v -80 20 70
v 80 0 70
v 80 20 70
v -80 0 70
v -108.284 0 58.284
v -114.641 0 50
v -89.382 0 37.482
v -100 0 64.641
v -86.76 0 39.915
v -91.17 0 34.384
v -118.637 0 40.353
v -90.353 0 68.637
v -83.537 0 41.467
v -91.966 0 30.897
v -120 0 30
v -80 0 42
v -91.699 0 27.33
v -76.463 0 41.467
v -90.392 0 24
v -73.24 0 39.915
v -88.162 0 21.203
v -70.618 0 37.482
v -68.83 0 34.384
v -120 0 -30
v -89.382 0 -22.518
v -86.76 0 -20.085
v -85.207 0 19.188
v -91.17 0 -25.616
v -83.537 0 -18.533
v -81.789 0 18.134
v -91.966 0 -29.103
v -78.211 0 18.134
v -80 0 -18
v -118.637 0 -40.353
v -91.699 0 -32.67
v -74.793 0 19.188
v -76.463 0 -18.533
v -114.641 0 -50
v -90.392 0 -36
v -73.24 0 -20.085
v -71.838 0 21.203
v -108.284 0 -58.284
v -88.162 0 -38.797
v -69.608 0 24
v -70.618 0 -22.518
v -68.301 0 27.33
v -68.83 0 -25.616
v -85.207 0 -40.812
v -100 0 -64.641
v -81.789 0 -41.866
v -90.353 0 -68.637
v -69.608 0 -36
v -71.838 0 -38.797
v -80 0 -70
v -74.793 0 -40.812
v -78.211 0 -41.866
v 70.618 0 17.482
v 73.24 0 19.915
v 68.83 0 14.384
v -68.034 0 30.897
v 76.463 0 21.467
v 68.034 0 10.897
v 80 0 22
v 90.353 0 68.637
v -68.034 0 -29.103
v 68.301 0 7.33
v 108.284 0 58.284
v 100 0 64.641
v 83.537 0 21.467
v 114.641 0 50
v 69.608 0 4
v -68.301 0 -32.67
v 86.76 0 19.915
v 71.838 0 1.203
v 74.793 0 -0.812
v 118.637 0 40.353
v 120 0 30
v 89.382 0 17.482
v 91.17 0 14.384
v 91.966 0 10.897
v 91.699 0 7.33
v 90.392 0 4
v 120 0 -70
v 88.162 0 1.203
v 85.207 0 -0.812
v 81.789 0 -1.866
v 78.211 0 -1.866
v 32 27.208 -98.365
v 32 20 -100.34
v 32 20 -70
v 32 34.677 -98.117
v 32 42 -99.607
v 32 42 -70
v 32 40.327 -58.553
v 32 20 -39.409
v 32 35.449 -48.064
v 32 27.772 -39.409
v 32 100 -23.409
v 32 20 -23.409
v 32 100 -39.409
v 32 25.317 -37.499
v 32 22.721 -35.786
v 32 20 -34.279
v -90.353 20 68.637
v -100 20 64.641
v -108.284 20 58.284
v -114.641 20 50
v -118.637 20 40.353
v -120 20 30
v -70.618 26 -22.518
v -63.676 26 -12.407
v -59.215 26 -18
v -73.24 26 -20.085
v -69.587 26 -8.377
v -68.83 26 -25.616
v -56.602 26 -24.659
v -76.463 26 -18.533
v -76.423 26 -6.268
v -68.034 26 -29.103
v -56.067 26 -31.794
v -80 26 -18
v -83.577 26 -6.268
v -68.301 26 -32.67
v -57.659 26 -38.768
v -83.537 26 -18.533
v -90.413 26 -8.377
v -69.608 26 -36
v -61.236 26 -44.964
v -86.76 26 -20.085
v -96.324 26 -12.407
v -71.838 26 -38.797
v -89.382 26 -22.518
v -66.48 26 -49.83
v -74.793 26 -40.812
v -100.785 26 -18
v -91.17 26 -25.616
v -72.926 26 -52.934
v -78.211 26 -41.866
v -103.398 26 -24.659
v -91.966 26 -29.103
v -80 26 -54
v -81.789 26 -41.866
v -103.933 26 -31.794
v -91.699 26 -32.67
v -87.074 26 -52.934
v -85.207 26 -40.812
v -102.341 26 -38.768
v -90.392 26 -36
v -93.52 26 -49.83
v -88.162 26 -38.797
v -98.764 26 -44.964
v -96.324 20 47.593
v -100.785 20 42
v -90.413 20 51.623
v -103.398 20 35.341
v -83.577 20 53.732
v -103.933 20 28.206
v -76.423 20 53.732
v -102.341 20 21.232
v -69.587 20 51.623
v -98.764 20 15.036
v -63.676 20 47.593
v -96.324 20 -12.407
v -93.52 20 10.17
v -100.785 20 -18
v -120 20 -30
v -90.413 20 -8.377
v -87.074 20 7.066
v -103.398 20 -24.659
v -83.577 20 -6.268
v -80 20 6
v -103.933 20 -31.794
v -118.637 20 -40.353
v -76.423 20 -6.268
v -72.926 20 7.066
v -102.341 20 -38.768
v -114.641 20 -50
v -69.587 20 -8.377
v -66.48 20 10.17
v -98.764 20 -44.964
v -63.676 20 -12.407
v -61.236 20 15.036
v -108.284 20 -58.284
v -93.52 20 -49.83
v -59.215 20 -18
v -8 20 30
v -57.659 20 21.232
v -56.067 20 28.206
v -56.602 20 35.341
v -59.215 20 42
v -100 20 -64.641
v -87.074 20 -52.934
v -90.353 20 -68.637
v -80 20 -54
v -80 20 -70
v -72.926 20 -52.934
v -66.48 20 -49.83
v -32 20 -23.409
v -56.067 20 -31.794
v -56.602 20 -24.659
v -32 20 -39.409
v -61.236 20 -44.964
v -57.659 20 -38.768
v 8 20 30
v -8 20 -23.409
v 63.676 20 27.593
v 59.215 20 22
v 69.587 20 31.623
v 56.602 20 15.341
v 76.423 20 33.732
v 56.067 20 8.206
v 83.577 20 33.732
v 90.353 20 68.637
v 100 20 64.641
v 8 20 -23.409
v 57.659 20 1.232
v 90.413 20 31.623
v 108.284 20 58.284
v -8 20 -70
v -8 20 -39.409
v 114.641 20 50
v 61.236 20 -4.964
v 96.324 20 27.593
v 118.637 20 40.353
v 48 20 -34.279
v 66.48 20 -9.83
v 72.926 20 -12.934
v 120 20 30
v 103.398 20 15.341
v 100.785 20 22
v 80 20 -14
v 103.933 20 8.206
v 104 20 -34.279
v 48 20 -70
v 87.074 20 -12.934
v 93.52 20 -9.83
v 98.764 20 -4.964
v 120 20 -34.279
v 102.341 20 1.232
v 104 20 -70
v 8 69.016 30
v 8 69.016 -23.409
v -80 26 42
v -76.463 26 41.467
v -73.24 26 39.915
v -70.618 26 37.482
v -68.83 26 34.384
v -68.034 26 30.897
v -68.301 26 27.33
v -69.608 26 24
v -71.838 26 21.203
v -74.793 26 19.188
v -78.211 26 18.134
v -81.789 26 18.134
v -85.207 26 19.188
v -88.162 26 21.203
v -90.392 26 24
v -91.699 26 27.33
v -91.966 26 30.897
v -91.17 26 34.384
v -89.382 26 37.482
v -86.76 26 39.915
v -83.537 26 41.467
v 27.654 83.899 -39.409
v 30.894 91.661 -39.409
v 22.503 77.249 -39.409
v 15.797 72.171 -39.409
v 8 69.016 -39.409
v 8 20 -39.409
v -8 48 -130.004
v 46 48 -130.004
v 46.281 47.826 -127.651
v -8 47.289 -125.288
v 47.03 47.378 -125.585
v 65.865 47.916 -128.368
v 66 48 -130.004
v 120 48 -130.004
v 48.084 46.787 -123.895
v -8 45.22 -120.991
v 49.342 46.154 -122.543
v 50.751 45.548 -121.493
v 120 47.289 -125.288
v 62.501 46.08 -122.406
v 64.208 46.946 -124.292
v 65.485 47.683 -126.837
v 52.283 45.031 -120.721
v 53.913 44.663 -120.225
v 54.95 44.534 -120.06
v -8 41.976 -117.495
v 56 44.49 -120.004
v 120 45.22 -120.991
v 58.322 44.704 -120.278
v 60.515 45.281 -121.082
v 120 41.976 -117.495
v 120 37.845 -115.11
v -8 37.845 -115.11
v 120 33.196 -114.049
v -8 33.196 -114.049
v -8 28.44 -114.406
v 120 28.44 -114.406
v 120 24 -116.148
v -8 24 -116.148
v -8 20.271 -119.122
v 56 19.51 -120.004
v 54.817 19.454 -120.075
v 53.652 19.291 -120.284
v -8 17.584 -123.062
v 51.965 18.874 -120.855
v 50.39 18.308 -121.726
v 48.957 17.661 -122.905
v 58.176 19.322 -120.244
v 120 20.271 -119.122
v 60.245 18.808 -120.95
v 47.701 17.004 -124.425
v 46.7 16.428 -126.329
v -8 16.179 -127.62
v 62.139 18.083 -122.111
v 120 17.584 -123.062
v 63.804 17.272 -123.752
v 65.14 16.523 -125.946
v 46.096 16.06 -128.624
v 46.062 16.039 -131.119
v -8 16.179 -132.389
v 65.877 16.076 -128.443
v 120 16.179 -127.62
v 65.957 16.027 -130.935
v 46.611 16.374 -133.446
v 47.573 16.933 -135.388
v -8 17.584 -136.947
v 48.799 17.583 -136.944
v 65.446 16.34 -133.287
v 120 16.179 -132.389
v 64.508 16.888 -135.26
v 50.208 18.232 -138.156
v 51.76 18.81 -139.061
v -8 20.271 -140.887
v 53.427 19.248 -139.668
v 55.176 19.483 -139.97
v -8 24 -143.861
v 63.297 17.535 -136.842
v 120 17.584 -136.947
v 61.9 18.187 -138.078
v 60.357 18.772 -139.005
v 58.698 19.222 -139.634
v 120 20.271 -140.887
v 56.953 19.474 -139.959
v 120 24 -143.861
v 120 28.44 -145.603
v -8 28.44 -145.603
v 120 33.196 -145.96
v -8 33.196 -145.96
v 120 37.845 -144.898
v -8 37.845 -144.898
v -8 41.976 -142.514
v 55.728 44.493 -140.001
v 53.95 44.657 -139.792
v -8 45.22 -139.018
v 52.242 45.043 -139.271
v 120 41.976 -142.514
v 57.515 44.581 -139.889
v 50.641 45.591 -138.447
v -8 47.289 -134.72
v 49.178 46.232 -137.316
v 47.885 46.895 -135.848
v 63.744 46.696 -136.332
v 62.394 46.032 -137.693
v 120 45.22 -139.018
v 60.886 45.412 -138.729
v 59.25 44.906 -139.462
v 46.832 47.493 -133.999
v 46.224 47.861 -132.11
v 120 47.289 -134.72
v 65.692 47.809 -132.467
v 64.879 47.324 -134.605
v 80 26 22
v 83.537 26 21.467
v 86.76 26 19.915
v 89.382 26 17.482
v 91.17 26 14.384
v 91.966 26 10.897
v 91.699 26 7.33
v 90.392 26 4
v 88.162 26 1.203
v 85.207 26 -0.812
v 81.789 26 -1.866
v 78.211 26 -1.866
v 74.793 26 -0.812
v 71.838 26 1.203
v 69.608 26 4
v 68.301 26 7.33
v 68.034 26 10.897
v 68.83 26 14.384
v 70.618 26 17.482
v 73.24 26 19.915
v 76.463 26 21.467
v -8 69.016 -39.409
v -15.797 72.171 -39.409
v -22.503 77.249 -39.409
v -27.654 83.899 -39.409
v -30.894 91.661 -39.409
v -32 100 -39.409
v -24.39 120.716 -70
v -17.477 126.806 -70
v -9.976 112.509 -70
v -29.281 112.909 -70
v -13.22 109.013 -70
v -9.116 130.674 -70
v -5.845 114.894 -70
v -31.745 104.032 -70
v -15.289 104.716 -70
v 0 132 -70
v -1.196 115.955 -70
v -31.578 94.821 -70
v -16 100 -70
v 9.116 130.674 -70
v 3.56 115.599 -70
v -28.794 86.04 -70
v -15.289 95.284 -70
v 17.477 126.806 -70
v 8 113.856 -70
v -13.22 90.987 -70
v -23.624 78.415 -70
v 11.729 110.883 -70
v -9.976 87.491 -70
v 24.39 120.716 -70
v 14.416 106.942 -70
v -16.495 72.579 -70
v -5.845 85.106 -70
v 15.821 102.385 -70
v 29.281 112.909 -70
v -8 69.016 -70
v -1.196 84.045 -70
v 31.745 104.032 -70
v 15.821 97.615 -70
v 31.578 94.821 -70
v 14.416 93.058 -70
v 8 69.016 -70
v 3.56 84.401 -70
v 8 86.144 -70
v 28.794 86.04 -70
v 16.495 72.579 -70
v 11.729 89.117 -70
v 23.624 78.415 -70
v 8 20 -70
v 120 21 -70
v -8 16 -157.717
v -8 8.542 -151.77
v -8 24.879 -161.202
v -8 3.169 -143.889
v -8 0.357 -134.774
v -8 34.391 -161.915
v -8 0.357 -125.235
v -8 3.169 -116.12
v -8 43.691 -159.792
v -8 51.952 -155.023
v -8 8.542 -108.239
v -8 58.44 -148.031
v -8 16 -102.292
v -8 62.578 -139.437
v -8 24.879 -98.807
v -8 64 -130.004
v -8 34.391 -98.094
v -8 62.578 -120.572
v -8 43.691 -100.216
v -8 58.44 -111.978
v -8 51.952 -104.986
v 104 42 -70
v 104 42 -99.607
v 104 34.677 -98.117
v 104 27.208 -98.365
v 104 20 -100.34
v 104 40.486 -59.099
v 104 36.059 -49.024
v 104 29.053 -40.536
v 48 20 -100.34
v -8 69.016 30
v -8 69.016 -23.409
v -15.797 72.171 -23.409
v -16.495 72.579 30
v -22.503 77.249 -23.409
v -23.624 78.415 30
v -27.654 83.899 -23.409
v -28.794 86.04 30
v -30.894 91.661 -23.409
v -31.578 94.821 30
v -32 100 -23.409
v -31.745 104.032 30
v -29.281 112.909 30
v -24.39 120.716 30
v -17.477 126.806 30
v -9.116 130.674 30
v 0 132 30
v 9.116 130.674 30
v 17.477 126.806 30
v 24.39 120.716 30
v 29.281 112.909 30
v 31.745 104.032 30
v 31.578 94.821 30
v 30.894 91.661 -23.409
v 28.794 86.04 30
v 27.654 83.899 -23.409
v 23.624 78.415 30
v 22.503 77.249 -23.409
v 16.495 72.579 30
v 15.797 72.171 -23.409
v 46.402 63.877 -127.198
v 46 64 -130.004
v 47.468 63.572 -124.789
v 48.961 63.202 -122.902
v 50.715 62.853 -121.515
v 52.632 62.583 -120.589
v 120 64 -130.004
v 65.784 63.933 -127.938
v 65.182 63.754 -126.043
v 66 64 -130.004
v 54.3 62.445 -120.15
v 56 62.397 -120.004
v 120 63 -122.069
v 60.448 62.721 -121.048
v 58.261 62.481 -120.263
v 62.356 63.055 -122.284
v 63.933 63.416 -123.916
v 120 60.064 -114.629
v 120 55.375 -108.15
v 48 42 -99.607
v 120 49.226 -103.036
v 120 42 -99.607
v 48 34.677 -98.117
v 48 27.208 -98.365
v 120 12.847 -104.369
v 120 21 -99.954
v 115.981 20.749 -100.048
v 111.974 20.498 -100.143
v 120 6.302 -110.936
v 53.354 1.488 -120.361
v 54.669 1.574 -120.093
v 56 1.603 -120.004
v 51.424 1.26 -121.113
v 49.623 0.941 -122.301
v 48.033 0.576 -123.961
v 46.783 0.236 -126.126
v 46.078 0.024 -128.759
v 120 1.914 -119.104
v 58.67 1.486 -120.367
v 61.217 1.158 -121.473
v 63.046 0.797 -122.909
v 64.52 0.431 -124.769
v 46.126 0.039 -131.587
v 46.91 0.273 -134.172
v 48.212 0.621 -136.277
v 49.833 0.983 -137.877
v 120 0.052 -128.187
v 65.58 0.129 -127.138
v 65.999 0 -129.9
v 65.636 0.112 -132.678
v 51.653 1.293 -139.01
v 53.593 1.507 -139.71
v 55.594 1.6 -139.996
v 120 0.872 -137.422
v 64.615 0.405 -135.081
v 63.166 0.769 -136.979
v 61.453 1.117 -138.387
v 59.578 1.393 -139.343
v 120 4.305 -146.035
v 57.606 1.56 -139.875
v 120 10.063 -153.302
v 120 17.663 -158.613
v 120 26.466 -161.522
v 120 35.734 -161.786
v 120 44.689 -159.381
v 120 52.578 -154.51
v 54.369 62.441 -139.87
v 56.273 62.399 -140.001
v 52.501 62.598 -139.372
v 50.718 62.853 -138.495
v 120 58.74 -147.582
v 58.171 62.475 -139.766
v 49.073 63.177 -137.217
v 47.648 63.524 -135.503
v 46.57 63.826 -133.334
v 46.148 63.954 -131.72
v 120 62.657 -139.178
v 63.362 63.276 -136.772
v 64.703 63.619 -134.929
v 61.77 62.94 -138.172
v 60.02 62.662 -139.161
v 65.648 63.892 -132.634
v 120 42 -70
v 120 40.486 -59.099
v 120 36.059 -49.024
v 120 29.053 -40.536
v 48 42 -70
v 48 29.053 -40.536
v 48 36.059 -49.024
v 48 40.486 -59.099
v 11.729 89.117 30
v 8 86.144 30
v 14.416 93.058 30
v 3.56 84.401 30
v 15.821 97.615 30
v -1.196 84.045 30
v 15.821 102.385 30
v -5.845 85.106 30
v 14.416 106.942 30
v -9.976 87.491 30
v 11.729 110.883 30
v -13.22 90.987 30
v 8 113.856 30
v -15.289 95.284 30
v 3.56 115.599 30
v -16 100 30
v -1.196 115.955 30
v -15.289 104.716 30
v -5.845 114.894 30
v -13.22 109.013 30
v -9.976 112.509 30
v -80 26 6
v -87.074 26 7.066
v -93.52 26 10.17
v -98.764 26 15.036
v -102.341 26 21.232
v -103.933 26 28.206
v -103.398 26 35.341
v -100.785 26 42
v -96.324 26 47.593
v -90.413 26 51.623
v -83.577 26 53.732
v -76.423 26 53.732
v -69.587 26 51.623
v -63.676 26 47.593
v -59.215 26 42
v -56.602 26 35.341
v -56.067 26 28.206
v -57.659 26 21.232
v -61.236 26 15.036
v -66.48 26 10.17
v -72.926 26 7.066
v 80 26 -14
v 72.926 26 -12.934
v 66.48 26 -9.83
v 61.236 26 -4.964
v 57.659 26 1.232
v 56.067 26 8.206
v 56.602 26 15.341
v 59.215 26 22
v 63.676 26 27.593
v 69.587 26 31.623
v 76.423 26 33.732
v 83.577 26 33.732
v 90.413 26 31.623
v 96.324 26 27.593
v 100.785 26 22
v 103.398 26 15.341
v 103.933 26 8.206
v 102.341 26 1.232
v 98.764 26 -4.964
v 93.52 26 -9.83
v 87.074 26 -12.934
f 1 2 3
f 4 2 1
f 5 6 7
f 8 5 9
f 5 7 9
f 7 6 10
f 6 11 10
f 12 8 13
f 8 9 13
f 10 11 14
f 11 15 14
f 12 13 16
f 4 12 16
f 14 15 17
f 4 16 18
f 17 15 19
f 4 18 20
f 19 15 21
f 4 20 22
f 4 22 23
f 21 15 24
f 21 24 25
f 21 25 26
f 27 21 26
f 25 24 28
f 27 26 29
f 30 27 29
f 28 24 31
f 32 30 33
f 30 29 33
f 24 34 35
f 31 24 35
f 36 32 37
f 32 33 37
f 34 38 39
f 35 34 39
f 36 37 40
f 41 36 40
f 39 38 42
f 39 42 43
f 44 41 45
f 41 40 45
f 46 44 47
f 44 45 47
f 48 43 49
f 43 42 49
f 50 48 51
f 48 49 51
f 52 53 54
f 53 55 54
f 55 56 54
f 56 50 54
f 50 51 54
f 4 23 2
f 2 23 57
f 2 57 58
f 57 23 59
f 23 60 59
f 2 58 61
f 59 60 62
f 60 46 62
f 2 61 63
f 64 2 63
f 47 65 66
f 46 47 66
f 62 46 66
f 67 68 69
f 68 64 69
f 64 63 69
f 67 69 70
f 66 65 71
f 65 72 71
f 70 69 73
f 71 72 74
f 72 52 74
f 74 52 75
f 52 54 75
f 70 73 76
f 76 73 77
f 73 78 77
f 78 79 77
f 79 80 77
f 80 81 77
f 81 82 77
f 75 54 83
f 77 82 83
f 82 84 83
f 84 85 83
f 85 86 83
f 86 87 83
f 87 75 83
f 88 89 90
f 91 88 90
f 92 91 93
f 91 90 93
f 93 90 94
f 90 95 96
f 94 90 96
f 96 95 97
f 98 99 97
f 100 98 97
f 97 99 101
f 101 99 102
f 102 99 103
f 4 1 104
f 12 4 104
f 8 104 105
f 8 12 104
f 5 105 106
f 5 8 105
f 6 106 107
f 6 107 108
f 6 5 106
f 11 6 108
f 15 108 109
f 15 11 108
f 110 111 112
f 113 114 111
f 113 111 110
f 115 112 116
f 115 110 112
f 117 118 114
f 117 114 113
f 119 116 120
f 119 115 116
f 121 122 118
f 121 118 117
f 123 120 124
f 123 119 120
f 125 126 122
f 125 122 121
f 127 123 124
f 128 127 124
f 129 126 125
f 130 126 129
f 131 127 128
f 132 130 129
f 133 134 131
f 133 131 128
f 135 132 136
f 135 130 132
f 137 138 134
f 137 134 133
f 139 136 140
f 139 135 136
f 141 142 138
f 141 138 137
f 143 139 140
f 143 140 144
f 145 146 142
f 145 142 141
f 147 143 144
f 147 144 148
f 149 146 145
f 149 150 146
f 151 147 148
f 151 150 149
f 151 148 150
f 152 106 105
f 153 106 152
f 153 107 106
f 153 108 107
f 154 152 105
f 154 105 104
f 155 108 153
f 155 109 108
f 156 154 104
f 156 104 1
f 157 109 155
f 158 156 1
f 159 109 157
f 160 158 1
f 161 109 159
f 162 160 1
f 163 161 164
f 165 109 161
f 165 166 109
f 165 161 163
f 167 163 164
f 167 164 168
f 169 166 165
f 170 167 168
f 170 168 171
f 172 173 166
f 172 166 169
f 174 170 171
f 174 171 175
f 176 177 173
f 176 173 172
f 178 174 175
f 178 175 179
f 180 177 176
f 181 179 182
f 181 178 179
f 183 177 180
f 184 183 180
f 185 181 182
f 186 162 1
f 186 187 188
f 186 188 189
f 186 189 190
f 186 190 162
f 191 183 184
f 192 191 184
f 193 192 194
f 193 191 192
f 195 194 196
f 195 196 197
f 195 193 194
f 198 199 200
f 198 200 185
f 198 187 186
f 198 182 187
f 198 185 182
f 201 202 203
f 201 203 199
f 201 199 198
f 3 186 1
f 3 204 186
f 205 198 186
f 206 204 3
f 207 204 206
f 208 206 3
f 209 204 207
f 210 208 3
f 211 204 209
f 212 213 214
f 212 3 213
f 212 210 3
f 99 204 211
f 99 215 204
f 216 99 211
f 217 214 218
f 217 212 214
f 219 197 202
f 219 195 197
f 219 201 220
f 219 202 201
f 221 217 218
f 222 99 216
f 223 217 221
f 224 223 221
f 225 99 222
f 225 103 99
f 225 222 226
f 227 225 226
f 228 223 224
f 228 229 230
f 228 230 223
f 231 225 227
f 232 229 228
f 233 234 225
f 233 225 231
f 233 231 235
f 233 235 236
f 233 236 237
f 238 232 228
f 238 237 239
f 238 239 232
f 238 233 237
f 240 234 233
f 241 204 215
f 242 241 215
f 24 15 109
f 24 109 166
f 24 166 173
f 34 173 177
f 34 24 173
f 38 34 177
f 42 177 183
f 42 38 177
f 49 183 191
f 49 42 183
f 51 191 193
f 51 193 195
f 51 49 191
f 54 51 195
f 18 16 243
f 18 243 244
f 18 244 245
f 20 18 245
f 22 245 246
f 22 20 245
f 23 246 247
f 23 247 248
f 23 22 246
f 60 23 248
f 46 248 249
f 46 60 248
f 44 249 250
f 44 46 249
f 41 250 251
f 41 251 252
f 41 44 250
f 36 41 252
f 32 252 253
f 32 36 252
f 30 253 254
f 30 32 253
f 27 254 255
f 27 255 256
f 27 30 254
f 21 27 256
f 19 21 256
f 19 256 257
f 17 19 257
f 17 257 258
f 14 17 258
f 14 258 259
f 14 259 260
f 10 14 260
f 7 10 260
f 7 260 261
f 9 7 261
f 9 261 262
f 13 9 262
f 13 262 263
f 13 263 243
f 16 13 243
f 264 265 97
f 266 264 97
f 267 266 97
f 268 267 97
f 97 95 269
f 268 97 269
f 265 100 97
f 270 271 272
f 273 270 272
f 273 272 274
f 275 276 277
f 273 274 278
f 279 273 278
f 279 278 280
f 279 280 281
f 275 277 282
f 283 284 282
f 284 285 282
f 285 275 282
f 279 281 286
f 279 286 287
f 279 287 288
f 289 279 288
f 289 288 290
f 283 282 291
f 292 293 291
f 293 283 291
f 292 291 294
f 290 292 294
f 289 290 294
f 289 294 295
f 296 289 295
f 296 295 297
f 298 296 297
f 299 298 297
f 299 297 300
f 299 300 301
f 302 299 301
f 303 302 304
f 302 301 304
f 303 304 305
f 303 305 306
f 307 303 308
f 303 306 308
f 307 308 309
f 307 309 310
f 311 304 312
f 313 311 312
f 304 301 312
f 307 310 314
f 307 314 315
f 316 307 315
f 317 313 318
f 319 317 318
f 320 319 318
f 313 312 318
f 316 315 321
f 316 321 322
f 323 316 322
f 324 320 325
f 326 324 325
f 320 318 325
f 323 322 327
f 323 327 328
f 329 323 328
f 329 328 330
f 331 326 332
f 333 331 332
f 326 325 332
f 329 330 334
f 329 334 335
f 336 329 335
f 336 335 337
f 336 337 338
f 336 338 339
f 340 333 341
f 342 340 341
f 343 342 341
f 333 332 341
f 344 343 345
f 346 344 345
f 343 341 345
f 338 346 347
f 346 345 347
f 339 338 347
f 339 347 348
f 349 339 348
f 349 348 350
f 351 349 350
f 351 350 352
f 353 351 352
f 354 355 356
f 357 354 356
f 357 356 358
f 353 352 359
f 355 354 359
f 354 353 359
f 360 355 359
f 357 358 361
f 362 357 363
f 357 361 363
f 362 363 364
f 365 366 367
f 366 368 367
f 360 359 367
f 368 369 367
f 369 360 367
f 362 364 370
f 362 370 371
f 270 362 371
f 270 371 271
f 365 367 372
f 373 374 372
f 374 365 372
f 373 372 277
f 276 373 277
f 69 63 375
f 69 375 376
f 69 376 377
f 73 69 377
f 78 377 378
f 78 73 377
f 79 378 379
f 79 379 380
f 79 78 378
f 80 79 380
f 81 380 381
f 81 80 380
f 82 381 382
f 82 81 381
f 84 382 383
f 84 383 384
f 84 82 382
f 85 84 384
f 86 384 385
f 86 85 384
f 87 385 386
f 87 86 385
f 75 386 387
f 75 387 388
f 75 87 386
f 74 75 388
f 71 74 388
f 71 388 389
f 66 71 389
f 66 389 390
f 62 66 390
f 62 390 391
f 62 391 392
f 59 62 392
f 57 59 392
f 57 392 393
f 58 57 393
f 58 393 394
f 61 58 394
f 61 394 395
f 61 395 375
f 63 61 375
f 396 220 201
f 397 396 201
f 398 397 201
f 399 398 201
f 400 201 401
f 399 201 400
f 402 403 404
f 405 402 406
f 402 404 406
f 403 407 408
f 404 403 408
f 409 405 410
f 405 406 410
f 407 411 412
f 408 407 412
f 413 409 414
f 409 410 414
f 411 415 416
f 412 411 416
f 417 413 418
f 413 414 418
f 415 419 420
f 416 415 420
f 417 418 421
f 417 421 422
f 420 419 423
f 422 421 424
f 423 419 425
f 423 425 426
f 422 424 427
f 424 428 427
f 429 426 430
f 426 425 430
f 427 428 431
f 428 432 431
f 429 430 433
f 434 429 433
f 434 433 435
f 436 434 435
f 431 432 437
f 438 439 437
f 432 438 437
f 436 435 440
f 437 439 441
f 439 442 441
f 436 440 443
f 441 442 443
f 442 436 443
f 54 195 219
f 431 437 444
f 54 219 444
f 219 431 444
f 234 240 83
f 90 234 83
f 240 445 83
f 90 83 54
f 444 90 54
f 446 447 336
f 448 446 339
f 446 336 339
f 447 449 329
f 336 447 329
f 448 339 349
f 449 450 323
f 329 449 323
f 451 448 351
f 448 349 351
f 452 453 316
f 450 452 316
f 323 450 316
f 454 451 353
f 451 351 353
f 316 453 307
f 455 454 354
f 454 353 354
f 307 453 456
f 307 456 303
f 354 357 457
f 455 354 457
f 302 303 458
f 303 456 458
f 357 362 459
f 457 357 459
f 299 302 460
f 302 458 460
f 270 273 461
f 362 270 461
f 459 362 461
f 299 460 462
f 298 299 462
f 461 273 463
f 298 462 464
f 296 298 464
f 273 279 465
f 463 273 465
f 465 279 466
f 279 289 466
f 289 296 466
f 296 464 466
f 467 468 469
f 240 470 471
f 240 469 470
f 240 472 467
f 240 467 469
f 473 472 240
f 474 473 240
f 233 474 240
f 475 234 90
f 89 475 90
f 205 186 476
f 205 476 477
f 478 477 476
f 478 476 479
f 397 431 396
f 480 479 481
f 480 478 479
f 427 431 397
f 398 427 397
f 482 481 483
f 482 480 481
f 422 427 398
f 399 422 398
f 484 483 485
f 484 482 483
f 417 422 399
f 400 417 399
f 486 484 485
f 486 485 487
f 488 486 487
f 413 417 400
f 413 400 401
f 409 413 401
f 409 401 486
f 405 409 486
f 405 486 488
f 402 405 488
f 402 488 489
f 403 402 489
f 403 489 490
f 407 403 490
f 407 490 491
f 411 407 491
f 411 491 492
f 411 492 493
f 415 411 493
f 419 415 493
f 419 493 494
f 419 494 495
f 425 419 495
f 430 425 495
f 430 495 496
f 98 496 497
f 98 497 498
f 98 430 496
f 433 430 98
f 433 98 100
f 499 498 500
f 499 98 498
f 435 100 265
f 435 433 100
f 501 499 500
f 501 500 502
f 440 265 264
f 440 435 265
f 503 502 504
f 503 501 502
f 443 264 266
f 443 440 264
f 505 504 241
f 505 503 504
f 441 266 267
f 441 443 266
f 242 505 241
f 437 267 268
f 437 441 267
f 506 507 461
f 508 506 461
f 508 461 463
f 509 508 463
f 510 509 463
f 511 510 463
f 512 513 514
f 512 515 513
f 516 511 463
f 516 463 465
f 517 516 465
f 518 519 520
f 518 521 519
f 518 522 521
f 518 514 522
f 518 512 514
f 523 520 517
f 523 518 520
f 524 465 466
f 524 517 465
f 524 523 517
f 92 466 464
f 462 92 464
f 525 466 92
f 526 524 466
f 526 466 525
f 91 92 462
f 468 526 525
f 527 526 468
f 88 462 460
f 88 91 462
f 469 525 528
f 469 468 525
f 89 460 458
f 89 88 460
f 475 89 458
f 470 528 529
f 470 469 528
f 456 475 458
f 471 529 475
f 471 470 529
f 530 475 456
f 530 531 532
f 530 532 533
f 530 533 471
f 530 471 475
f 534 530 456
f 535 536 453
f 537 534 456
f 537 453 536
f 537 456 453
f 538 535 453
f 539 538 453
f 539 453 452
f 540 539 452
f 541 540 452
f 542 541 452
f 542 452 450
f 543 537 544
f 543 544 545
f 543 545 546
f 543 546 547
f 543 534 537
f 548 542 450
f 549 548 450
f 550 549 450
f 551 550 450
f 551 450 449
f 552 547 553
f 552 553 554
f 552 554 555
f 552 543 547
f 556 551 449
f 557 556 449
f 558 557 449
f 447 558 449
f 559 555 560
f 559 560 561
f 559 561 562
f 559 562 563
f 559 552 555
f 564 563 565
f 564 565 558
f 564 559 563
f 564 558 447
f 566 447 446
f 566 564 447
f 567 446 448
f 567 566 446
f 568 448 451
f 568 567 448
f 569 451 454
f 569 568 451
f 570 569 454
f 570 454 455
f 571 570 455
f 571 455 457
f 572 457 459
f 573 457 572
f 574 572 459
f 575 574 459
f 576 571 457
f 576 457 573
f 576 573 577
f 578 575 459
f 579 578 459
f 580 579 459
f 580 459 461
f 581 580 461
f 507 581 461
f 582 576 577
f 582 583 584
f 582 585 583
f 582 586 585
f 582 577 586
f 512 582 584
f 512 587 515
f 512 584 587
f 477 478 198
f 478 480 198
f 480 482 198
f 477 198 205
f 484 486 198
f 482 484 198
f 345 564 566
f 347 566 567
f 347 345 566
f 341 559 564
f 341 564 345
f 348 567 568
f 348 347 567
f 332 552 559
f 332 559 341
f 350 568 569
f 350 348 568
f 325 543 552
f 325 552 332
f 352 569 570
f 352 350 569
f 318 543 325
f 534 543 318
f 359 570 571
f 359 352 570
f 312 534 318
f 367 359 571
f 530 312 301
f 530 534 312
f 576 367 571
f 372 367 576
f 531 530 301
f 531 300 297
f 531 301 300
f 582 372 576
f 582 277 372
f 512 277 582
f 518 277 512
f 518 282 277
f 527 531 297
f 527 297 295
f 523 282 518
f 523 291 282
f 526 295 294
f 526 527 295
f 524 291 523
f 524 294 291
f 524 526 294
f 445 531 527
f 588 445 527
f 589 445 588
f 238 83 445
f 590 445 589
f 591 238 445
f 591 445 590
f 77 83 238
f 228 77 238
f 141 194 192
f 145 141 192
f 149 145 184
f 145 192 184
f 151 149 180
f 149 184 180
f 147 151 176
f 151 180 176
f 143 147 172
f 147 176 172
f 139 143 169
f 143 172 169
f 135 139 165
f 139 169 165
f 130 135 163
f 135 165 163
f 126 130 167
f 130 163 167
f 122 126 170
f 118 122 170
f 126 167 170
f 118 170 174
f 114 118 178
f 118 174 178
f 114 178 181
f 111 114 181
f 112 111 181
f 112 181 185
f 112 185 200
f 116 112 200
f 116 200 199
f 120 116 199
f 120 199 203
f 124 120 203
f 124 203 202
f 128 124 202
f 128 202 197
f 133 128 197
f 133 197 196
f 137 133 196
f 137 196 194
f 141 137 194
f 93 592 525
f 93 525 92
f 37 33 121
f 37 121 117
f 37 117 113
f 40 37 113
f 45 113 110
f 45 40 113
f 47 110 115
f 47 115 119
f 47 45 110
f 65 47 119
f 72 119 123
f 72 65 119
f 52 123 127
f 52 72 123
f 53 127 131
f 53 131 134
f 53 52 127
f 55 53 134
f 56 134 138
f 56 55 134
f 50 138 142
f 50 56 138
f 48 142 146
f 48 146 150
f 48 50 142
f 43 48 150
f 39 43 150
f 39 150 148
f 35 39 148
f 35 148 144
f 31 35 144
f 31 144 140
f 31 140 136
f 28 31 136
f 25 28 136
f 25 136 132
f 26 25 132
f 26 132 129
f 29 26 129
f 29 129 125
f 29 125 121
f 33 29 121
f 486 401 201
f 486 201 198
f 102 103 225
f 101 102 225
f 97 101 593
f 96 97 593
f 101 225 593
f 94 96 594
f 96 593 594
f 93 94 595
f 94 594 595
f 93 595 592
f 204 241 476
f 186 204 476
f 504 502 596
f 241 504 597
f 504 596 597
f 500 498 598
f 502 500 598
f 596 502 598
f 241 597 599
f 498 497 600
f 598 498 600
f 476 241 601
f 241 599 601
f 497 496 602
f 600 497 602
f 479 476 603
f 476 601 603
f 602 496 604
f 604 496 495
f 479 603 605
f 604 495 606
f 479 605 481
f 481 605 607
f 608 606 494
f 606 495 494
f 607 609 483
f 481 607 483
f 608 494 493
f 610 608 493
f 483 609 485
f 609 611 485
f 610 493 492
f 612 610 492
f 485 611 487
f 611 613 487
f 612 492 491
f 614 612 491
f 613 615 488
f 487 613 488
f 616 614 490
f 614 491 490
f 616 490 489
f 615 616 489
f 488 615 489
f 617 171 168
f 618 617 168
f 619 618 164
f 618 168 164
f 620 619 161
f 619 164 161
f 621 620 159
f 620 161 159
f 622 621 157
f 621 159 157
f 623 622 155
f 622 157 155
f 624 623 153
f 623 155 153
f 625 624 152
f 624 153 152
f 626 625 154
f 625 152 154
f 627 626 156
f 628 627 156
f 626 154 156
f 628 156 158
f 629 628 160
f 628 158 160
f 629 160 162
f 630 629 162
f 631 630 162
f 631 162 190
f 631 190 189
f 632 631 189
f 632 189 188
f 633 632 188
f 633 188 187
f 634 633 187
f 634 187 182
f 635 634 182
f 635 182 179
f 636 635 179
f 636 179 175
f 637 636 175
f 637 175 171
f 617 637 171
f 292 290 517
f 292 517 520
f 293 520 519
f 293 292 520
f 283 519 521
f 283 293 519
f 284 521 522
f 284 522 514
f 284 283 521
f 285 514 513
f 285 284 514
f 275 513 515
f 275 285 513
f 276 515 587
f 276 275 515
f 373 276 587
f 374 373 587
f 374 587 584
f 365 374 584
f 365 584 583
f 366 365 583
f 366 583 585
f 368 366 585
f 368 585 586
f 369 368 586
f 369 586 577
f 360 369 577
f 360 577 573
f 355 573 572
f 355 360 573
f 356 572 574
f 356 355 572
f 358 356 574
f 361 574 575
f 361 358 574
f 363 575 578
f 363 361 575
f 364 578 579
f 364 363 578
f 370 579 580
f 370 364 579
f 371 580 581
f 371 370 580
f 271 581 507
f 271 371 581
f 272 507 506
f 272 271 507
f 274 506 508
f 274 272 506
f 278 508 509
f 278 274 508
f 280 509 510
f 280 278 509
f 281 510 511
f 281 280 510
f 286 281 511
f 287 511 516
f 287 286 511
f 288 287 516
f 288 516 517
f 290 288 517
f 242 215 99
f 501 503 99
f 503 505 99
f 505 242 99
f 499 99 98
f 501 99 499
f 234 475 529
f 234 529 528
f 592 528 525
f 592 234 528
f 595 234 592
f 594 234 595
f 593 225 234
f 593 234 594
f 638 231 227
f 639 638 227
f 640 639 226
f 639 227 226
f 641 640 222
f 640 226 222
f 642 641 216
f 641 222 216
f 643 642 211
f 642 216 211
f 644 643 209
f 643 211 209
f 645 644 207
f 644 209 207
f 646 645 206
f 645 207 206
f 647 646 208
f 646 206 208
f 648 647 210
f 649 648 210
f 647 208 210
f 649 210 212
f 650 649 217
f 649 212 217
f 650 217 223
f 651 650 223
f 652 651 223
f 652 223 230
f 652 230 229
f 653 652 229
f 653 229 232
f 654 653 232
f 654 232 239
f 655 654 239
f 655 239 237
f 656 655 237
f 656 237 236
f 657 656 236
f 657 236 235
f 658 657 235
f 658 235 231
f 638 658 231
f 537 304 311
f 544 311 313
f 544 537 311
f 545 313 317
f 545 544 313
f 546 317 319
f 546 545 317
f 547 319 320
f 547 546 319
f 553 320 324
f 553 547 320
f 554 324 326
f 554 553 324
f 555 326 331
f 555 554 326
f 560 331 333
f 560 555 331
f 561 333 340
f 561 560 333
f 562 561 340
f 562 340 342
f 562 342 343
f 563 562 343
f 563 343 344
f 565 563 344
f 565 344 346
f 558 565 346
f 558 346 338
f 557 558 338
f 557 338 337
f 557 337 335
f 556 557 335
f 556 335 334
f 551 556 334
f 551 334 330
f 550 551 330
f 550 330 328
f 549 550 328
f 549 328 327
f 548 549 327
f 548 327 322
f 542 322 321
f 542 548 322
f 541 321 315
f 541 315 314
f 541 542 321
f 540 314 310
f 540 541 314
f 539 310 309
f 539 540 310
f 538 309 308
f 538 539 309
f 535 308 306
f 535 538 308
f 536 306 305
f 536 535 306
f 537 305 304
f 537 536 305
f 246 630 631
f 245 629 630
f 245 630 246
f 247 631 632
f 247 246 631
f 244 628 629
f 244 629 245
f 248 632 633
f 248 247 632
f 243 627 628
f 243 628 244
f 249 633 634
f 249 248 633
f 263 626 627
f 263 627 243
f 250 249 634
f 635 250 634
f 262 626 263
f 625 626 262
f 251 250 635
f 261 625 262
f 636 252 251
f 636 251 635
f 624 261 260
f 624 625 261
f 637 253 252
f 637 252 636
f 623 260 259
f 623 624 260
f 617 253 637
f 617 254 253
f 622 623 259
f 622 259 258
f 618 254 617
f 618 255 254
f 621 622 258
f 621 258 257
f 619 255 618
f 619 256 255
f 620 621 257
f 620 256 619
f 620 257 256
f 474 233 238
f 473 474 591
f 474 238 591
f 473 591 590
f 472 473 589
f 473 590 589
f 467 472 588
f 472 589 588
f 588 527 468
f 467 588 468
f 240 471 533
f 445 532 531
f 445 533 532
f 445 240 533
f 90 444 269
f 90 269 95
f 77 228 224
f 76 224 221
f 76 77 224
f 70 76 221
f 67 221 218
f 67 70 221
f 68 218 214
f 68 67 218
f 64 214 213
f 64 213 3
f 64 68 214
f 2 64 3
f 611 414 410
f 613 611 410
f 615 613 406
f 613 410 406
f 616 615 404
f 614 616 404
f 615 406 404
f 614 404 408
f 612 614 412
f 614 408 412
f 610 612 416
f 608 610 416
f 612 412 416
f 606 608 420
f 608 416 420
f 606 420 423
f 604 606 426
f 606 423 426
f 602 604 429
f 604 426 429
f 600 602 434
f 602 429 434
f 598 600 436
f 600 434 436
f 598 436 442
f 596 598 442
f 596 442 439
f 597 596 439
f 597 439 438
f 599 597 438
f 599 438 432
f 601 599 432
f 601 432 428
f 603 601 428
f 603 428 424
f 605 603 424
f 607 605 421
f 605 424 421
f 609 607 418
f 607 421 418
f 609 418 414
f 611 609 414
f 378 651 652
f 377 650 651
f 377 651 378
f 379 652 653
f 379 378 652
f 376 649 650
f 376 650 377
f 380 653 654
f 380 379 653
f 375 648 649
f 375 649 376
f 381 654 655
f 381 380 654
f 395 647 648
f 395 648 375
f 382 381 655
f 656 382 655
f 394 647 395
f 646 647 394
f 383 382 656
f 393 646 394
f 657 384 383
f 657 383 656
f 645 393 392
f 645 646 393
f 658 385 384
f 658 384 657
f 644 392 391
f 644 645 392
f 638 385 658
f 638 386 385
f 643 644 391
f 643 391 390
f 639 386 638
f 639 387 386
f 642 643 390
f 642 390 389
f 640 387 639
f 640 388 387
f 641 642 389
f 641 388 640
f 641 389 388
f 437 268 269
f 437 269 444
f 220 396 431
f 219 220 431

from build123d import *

# Parameters (mm, degrees)
SKETCH_3_R               = 12
EXTRUDE_2_DEPTH          = 20
SKETCH_3_7_R             = 24
SKETCH_3_7_R_2           = 12
EXTRUDE_3_DEPTH          = 26
EXTRUDE_5_DEPTH          = 100
EXTRUDE_6_REACH          = 180.449
EXTRUDE_6_END_RADIUS     = 32
SKETCH_15_W              = 16
SKETCH_15_H              = 100
EXTRUDE_9_REACH          = 180.449
EXTRUDE_9_END_RADIUS     = 32
SKETCH_16_W              = 24
SKETCH_16_H              = 16
SKETCH_25_R              = 32
SKETCH_25_R_2            = 16
EXTRUDE_10_DEPTH         = 128
CUT_EXTRUDE_1_DEPTH      = 231.628319156
CUT_EXTRUDE_1_DEPTH_BACK = 231.628319156
SKETCH_28_R              = 10
EXTRUDE_11_DEPTH         = 16
EXTRUDE_12_DEPTH         = 16
EXTRUDE_13_REACH         = 228.769
EXTRUDE_13_END_RADIUS    = 32
EXTRUDE_14_REACH         = 228.769
EXTRUDE_14_END_RADIUS    = 32
SKETCH_38_W              = 16
SKETCH_38_H              = 22


with BuildPart() as part:
    # 草图3 → 凸台-拉伸2 (new body)
    with BuildSketch(Plane(origin=(0, 0, 0), x_dir=(1, 0, 0), z_dir=(0, 1, 0))):
        with BuildLine():
            ThreePointArc((-120, -30), (-108.284271247, -58.284271247), (-80, -70))
            Line((-80, -70), (80, -70))
            ThreePointArc((80, -70), (108.284271247, -58.284271247), (120, -30))
            Line((120, -30), (120, 70))
            Line((120, 70), (-80, 70))
            ThreePointArc((-80, 70), (-108.284271247, 58.284271247), (-120, 30))
            Line((-120, 30), (-120, -30))
        make_face()
        with Locations((-80, 30)):
            Circle(SKETCH_3_R, mode=Mode.SUBTRACT)
        with Locations((-80, -30)):
            Circle(SKETCH_3_R, mode=Mode.SUBTRACT)
        with Locations((80, -10)):
            Circle(SKETCH_3_R, mode=Mode.SUBTRACT)
    extrude(amount=EXTRUDE_2_DEPTH)

    # 草图3<7> → 凸台-拉伸3 (add)
    # profile 1 of 3: a face of its own
    with BuildSketch(Plane(origin=(0, 0, 0), x_dir=(1, 0, 0), z_dir=(0, 1, 0))):
        with Locations((-80, 30)):
            Circle(SKETCH_3_7_R)
        with Locations((-80, 30)):
            Circle(SKETCH_3_7_R_2, mode=Mode.SUBTRACT)
    # profile 2 of 3: a face of its own
    with BuildSketch(Plane(origin=(0, 0, 0), x_dir=(1, 0, 0), z_dir=(0, 1, 0))):
        with Locations((-80, -30)):
            Circle(SKETCH_3_7_R)
        with Locations((-80, -30)):
            Circle(SKETCH_3_7_R_2, mode=Mode.SUBTRACT)
    # profile 3 of 3: a face of its own
    with BuildSketch(Plane(origin=(0, 0, 0), x_dir=(1, 0, 0), z_dir=(0, 1, 0))):
        with Locations((80, -10)):
            Circle(SKETCH_3_7_R)
        with Locations((80, -10)):
            Circle(SKETCH_3_7_R_2, mode=Mode.SUBTRACT)
    extrude(amount=EXTRUDE_3_DEPTH)



with BuildPart() as body_2:
    # 草图10 → 凸台-拉伸5 (new body)
    with BuildSketch(Plane(origin=(0, 0, -70), x_dir=(-1, 0, 0), z_dir=(0, 0, -1))):
        with BuildLine():
            ThreePointArc((32, 100), (-22.627416998, 122.627416998), (0, 68))
            ThreePointArc((0, 68), (22.627416998, 77.372583002), (32, 100))
        make_face()
        with BuildLine():
            ThreePointArc((16, 100), (11.313708499, 88.686291501), (0, 84))
            ThreePointArc((0, 84), (-11.313708499, 111.313708499), (16, 100))
        make_face(mode=Mode.SUBTRACT)
    extrude(amount=-EXTRUDE_5_DEPTH)


with BuildPart() as part_1:
    add(part.part)

    add(body_2.part)  # 凸台-拉伸6 merges body 2
    # 凸台-拉伸6: up to this cylinder (the profile starts outside it)
    extrude_6_end = Plane(origin=(0, 100, -20), z_dir=(0, 0, -1)) * Cylinder(EXTRUDE_6_END_RADIUS, 425.898, mode=Mode.PRIVATE)
    # 草图15 → 凸台-拉伸6 (add, up to the surface)
    with BuildSketch(Plane(origin=(0, 20, 0), x_dir=(1, 0, 0), z_dir=(0, 1, 0)), mode=Mode.PRIVATE) as extrude_6_sk1:
        with Locations((0, 20)):
            Rectangle(SKETCH_15_W, SKETCH_15_H)
    extrude_6_tool1 = extrude(extrude_6_sk1.sketch, amount=EXTRUDE_6_REACH, mode=Mode.PRIVATE) - extrude_6_end
    add(extrude_6_tool1.solids().sort_by_distance((0, 20, -20))[0])

    # 凸台-拉伸9: up to this cylinder (the profile starts outside it)
    extrude_9_end = Plane(origin=(0, 100, -31.409304), z_dir=(0, 0, -1)) * Cylinder(EXTRUDE_9_END_RADIUS, 425.898, mode=Mode.PRIVATE)
    # 草图16 → 凸台-拉伸9 (add, up to the surface)
    with BuildSketch(Plane(origin=(0, 20, 0), x_dir=(1, 0, 0), z_dir=(0, 1, 0)), mode=Mode.PRIVATE) as extrude_9_sk1:
        with Locations((20, 31.409304245)):
            Rectangle(SKETCH_16_W, SKETCH_16_H)
    extrude_9_tool1 = extrude(extrude_9_sk1.sketch, amount=EXTRUDE_9_REACH, mode=Mode.PRIVATE) - extrude_9_end
    add(extrude_9_tool1.solids().sort_by_distance((20, 20, -31.409304))[0])
    # 草图16 → 凸台-拉伸9 (add, up to the surface)
    with BuildSketch(Plane(origin=(0, 20, 0), x_dir=(1, 0, 0), z_dir=(0, 1, 0)), mode=Mode.PRIVATE) as extrude_9_sk2:
        with Locations((-20, 31.409304245)):
            Rectangle(SKETCH_16_W, SKETCH_16_H)
    extrude_9_tool2 = extrude(extrude_9_sk2.sketch, amount=EXTRUDE_9_REACH, mode=Mode.PRIVATE) - extrude_9_end
    add(extrude_9_tool2.solids().sort_by_distance((-20, 20, -31.409304))[0])

    # 草图30 → 凸台-拉伸11 (add)
    with BuildSketch(Plane(origin=(120, 0, 0), x_dir=(0, 0, -1), z_dir=(1, 0, 0))):
        with BuildLine():
            Line((70, 42), (70, 20))
            Line((70, 20), (34.278857801, 20))
            ThreePointArc((34.278857801, 20), (49.023823037, 36.058772732), (70, 42))
        make_face()
    extrude(amount=-EXTRUDE_11_DEPTH)

    # 草图34 → 凸台-拉伸12 (add)
    with BuildSketch(Plane(origin=(48, 0, 0), x_dir=(0, 0, -1), z_dir=(1, 0, 0))):
        with BuildLine():
            ThreePointArc((70, 42), (49.023823037, 36.058772732), (34.278857801, 20))
            Line((34.278857801, 20), (70, 20))
            Line((70, 20), (70, 42))
        make_face()
    extrude(amount=-EXTRUDE_12_DEPTH)



with BuildPart() as body_2_2:
    # 草图25 → 凸台-拉伸10 (new body)
    with BuildSketch(Plane(origin=(120, 0, 0), x_dir=(0, 0, -1), z_dir=(1, 0, 0))):
        with Locations((130.004387585, 32)):
            Circle(SKETCH_25_R)
        with Locations((130.004387585, 32)):
            Circle(SKETCH_25_R_2, mode=Mode.SUBTRACT)
    extrude(amount=-EXTRUDE_10_DEPTH)

    # 草图28 → 切除-拉伸1 (cut, two sides: drawn at the far end of the back side and taken through both)
    with BuildSketch(Plane(origin=(0, 20, 0), x_dir=(1, 0, 0), z_dir=(0, 1, 0)).offset(-CUT_EXTRUDE_1_DEPTH_BACK)):
        with Locations((56, 130.004387585)):
            Circle(SKETCH_28_R)
    extrude(amount=CUT_EXTRUDE_1_DEPTH + CUT_EXTRUDE_1_DEPTH_BACK, mode=Mode.SUBTRACT)


with BuildPart() as part_2:
    add(part_1.part)

    add(body_2_2.part)  # 凸台-拉伸13 merges body 2 2
    # 凸台-拉伸13: up to this cylinder (the profile starts outside it)
    extrude_13_end = Plane(origin=(111.937984, 32, -130.004387585), z_dir=(1, 0, 0)) * Cylinder(EXTRUDE_13_END_RADIUS, 522.538, mode=Mode.PRIVATE)
    # 草图37 → 凸台-拉伸13 (add, up to the surface)
    with BuildSketch(Plane(origin=(0, 0, -70), x_dir=(-1, 0, 0), z_dir=(0, 0, -1)), mode=Mode.PRIVATE) as extrude_13_sk1:
        Polygon((-104, 20), (-120, 21), (-120, 42), (-104, 42), align=None)
    extrude_13_tool1 = extrude(extrude_13_sk1.sketch, amount=EXTRUDE_13_REACH, mode=Mode.PRIVATE) - extrude_13_end
    add(extrude_13_tool1.solids().sort_by_distance((111.937984, 31.248062, -70))[0])

    # 凸台-拉伸14: up to this cylinder (the profile starts outside it)
    extrude_14_end = Plane(origin=(40, 32, -130.004387585), z_dir=(1, 0, 0)) * Cylinder(EXTRUDE_14_END_RADIUS, 522.538, mode=Mode.PRIVATE)
    # 草图38 → 凸台-拉伸14 (add, up to the surface)
    with BuildSketch(Plane(origin=(0, 0, -70), x_dir=(-1, 0, 0), z_dir=(0, 0, -1)), mode=Mode.PRIVATE) as extrude_14_sk1:
        with Locations((-40, 31)):
            Rectangle(SKETCH_38_W, SKETCH_38_H)
    extrude_14_tool1 = extrude(extrude_14_sk1.sketch, amount=EXTRUDE_14_REACH, mode=Mode.PRIVATE) - extrude_14_end
    add(extrude_14_tool1.solids().sort_by_distance((40, 31, -70))[0])


solid = part_2.part
